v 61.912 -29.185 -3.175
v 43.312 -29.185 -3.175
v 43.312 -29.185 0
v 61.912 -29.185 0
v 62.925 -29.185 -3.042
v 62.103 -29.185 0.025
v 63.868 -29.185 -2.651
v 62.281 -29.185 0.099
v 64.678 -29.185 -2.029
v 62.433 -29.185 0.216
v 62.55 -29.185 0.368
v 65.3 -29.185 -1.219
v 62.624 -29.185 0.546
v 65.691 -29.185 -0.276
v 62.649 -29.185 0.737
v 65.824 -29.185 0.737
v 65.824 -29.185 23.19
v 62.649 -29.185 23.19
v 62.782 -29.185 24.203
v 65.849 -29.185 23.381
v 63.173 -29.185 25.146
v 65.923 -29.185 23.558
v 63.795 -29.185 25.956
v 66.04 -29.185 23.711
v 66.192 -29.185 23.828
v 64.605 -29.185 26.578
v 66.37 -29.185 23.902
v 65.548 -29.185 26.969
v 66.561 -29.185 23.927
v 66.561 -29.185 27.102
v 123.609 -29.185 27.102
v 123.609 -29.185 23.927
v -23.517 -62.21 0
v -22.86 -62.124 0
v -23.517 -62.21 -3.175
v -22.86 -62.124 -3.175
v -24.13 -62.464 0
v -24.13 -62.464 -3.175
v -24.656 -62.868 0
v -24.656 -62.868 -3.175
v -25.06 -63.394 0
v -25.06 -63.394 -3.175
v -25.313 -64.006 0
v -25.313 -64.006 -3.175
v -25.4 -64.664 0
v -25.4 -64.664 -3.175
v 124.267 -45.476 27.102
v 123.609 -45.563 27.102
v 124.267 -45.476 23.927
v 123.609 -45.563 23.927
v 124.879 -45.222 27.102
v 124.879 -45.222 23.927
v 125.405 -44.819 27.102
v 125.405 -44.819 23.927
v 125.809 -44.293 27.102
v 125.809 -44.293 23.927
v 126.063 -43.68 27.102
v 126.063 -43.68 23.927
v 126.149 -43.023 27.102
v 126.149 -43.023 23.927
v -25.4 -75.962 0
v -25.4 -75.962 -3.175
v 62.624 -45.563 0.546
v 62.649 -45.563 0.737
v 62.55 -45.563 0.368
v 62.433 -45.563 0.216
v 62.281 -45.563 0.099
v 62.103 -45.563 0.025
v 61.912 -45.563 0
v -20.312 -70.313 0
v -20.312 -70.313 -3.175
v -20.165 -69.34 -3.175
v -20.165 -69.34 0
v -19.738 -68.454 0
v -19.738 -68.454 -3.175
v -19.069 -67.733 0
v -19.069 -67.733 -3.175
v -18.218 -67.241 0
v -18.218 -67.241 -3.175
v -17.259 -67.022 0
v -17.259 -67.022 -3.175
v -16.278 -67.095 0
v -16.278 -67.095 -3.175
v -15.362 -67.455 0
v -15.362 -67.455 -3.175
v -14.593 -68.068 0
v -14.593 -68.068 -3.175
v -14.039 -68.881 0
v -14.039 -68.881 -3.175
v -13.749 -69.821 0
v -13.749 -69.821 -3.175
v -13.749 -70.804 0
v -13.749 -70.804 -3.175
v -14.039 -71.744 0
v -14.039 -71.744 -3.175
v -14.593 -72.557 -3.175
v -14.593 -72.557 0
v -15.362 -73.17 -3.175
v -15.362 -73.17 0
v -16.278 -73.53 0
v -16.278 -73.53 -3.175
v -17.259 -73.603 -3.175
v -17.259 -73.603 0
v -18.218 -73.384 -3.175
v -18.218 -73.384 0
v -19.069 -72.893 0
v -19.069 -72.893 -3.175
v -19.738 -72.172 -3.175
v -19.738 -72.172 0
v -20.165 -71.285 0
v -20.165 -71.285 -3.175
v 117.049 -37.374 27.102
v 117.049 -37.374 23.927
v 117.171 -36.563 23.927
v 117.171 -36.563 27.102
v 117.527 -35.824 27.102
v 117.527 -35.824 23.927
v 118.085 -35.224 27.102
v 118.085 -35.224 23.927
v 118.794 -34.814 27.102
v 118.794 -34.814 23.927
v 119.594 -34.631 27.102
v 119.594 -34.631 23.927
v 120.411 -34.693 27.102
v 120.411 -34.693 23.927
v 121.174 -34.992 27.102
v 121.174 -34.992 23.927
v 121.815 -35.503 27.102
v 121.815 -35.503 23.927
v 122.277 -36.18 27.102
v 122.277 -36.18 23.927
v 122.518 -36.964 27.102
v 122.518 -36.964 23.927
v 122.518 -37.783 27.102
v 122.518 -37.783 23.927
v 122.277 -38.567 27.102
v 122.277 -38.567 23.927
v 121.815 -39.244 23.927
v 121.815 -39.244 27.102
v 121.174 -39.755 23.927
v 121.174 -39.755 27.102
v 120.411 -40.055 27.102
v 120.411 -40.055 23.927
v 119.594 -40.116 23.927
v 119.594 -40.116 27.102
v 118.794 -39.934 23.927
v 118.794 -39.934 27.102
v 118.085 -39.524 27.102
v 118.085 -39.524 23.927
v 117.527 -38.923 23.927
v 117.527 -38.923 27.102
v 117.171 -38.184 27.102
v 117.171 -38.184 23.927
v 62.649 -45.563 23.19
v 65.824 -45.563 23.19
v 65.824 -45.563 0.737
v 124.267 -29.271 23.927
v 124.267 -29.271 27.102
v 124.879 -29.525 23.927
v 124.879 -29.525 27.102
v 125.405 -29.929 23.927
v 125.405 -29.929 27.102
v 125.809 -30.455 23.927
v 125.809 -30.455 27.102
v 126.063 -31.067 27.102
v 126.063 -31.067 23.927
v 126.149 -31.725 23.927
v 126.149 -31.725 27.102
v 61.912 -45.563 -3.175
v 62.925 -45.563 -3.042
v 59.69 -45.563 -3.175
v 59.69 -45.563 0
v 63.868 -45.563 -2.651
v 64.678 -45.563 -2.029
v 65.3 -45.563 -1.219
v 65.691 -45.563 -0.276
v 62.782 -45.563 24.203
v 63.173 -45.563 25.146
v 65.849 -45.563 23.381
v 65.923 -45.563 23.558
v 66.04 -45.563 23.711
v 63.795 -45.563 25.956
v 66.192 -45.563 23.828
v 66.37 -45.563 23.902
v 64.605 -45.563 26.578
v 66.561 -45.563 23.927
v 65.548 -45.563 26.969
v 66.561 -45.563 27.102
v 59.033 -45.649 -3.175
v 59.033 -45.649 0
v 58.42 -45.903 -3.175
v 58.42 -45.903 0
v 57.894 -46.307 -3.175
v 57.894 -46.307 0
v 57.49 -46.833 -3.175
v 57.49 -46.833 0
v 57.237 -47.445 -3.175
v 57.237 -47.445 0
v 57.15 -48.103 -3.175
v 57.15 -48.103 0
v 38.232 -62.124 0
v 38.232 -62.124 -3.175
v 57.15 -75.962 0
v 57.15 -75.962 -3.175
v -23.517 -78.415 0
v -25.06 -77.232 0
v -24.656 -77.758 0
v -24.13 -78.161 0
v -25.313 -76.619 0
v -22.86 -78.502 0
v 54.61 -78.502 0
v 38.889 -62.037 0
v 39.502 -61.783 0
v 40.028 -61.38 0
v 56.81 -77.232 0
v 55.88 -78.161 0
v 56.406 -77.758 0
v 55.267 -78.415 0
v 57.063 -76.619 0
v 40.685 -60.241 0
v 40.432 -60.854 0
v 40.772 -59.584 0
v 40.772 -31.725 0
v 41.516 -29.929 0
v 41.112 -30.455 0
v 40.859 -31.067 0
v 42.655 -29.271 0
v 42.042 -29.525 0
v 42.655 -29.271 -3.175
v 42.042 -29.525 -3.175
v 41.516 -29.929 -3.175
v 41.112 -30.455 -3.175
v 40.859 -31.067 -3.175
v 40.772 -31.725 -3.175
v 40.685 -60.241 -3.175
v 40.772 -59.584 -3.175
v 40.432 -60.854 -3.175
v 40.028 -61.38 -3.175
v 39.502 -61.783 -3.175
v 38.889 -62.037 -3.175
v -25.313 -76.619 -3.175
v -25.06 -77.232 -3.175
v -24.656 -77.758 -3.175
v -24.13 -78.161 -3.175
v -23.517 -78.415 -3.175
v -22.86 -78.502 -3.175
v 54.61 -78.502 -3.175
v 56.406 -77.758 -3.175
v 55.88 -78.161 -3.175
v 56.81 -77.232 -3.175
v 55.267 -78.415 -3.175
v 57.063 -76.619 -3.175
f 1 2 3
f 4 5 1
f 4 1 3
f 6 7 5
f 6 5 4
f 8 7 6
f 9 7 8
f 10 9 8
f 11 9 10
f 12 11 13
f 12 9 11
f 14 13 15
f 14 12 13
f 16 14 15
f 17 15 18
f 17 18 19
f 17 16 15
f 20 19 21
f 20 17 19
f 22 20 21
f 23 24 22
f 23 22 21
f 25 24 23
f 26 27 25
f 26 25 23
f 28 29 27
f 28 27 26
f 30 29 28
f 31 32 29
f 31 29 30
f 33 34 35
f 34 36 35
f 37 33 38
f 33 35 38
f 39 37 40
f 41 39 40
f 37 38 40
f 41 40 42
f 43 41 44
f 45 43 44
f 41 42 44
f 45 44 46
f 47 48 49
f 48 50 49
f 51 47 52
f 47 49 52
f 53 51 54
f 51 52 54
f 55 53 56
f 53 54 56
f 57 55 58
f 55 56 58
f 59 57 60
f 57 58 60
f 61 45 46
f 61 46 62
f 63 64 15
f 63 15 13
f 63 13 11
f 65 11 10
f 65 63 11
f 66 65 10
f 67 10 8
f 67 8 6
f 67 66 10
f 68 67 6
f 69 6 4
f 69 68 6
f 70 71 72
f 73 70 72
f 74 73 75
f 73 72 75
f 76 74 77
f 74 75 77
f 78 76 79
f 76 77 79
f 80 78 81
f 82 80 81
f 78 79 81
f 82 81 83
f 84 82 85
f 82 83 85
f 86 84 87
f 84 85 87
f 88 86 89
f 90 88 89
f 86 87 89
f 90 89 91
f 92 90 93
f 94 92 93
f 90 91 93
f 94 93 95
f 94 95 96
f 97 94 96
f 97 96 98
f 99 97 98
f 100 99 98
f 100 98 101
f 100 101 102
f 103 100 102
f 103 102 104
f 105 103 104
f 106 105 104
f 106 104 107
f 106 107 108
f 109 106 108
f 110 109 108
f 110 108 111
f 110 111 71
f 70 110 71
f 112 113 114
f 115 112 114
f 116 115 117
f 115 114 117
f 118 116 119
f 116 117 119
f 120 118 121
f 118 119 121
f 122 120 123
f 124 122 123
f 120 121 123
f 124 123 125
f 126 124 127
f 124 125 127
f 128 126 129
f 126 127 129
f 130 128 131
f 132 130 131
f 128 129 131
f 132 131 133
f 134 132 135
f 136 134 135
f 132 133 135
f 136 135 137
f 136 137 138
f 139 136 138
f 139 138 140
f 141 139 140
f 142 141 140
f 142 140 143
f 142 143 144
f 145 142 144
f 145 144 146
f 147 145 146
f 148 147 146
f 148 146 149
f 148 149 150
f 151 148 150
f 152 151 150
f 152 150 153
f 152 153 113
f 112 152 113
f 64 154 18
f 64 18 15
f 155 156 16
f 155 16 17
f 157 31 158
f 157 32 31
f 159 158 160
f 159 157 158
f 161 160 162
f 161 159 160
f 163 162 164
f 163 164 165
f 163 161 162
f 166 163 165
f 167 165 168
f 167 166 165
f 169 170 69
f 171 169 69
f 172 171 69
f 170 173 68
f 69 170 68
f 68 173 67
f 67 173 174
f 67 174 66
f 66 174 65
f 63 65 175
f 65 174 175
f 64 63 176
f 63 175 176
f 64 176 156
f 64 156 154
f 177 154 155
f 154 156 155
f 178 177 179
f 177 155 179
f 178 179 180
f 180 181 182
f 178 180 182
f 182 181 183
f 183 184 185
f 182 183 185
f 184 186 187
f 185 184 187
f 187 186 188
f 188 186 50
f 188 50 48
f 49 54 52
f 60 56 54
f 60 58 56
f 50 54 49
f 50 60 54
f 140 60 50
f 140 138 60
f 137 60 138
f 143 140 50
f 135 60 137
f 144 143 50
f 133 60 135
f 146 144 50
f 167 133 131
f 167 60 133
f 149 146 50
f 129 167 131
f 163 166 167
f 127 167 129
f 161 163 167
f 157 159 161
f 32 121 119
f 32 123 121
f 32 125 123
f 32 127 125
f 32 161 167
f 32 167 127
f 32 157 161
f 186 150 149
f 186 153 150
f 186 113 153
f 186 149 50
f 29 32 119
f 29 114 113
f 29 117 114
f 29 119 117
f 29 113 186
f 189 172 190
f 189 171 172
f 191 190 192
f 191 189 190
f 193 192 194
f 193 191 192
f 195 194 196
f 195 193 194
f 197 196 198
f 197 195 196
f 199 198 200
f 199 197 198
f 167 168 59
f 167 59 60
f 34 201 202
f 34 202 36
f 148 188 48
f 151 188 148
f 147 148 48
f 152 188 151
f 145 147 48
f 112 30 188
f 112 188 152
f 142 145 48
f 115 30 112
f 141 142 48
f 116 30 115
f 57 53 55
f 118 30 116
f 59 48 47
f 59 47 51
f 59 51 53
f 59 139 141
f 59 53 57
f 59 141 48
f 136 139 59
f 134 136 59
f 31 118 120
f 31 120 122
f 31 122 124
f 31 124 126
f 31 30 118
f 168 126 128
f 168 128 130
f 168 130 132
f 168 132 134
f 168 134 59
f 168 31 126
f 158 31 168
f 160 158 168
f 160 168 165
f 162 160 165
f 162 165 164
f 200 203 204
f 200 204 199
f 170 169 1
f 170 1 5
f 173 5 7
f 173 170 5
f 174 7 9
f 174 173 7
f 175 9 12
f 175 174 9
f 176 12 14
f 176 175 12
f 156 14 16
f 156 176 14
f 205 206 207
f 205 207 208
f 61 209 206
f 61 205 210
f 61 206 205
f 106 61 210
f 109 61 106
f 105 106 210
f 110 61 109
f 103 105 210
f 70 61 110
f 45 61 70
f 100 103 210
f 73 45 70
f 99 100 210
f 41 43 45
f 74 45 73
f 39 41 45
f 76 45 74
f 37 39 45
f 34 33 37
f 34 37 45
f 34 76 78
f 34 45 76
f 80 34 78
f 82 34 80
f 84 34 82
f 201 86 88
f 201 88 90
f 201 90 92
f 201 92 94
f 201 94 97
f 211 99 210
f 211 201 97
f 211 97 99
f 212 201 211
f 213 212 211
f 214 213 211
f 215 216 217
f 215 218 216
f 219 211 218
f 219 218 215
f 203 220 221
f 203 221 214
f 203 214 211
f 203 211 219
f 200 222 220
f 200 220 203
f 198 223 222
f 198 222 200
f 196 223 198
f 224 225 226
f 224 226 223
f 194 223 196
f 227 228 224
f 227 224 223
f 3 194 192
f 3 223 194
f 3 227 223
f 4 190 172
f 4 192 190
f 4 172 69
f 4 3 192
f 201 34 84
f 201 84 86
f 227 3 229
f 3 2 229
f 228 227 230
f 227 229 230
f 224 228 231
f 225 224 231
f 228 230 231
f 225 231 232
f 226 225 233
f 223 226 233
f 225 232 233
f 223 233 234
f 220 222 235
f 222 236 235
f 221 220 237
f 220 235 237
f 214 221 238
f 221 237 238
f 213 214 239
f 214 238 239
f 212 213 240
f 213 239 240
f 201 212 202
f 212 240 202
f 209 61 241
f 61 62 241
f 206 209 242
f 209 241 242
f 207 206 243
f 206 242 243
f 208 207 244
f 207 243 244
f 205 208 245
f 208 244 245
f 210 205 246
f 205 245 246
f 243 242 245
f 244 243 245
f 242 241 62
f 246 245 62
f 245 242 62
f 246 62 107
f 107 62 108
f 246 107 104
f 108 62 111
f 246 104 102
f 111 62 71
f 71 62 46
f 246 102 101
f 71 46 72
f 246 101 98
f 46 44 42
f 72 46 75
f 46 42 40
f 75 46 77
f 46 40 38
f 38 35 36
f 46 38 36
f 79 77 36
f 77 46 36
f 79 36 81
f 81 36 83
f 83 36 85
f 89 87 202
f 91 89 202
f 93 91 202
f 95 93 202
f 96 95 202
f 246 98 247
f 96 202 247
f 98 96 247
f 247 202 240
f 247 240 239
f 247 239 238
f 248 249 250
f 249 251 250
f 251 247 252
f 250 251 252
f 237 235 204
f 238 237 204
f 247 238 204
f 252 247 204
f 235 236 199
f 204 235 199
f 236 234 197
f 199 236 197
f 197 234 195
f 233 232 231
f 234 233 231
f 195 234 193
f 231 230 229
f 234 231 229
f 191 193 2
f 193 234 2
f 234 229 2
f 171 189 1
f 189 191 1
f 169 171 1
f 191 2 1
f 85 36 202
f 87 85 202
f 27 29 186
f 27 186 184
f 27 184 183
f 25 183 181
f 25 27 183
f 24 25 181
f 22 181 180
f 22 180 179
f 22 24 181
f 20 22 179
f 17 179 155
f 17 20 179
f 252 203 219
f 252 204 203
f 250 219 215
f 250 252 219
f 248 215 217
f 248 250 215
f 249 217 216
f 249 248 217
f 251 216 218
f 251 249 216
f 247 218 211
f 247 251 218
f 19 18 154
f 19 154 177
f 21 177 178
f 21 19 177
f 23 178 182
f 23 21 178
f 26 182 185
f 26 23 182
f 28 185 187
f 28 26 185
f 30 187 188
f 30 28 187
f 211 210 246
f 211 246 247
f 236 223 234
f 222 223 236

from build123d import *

# Parameters (mm, degrees)
BASE_FLANGE1_DEPTH           = 3.175
EDGE_FLANGE1_DEPTH           = 16.378
EDGE_FLANGE2_STRIP_W         = 14.1732
EDGE_FLANGE2_STRIP_H         = 3.175
EDGE_FLANGE2_STRIP_CUT_DEPTH = 16.378
EDGE_FLANGE2_DEPTH           = 16.378
M5_CLEARANCE_HOLE1_D         = 5.5
M6_CLEARANCE_HOLE1_D         = 6.6
FILLET1_R                    = 2.54


# Sheet-metal steps are written as plain solids
with BuildPart() as part:
    # Sketch1 → Base-Flange1 (new body)
    with BuildSketch(Plane.XY):
        Polygon((40.772, -29.184600001), (40.772, -45.562600001), (40.772, -62.123600001), (-25.39999999, -62.123600001), (-25.39999999, -78.501600001), (57.15000001, -78.501600001), (57.15000001, -45.562600001), (61.9125, -45.562600001), (61.9125, -29.184600001), align=None)
    extrude(amount=-BASE_FLANGE1_DEPTH)

    # Edge-Flange1 section (across the edge) → Edge-Flange1 (add)
    with BuildSketch(Plane(origin=(62.6491, -45.562600001, 0), x_dir=(-1, 0, 0), z_dir=(0, 1, 0))):
        with BuildLine():
            Line((-3.175, 0.7366), (-3.175, 23.9268))
            Line((-3.175, 23.9268), (0, 23.9268))
            Line((0, 23.9268), (0, 0.7366))
            ThreePointArc((0, 0.7366), (0.215745145, 0.215745145), (0.7366, 0))
            Line((0.7366, 0), (0.7366, -3.175))
            ThreePointArc((0.7366, -3.175), (-2.029318885, -2.029318885), (-3.175, 0.7366))
        make_face()
    extrude(amount=EDGE_FLANGE1_DEPTH)

    # Edge-Flange2 strip (across the edge) → Edge-Flange2 strip cut (cut)
    with BuildSketch(Plane(origin=(65.8241, -29.184600001, 23.9268), x_dir=(0, 0, -1), z_dir=(0, -1, 0))):
        with Locations((-6.35, -1.5875)):
            Rectangle(EDGE_FLANGE2_STRIP_W, EDGE_FLANGE2_STRIP_H)
    extrude(amount=EDGE_FLANGE2_STRIP_CUT_DEPTH, mode=Mode.SUBTRACT)

    # Edge-Flange2 section (across the edge) → Edge-Flange2 (add)
    with BuildSketch(Plane(origin=(65.8241, -29.184600001, 23.9268), x_dir=(0, 0, -1), z_dir=(0, -1, 0))):
        with BuildLine():
            Line((-3.175, 0.7366), (-3.175, 60.325))
            Line((-3.175, 60.325), (0, 60.325))
            Line((0, 60.325), (0, 0.7366))
            ThreePointArc((0, 0.7366), (0.215745145, 0.215745145), (0.7366, 0))
            Line((0.7366, 0), (0.7366, -3.175))
            ThreePointArc((0.7366, -3.175), (-2.029318885, -2.029318885), (-3.175, 0.7366))
        make_face()
    extrude(amount=EDGE_FLANGE2_DEPTH)

    # M5 Clearance Hole1 (through all)
    with Locations(Plane.XY.offset(27.1018)):
        with Locations((119.7991, -37.373600001)):
            Hole(M5_CLEARANCE_HOLE1_D / 2)

    # M6 Clearance Hole1 (through all)
    with Locations(Plane.XY):
        with Locations((-17.0119, -70.312600001)):
            Hole(M6_CLEARANCE_HOLE1_D / 2)

    # Fillet1
    fillet1_edges = [part.edges().sort_by_distance(p)[0] for p in [
        (-25.39999999, -62.123600001, -1.5875),
        (40.772, -62.123600001, -1.5875),
        (40.772, -29.184600001, -1.5875),
        (57.15000001, -45.562600001, -1.5875),
        (57.15000001, -78.501600001, -1.5875),
        (-25.39999999, -78.501600001, -1.5875),
        (126.1491, -29.184600001, 25.5143),
        (126.1491, -45.562600001, 25.5143),
    ]]
    fillet(fillet1_edges, radius=FILLET1_R)


solid = part.part
